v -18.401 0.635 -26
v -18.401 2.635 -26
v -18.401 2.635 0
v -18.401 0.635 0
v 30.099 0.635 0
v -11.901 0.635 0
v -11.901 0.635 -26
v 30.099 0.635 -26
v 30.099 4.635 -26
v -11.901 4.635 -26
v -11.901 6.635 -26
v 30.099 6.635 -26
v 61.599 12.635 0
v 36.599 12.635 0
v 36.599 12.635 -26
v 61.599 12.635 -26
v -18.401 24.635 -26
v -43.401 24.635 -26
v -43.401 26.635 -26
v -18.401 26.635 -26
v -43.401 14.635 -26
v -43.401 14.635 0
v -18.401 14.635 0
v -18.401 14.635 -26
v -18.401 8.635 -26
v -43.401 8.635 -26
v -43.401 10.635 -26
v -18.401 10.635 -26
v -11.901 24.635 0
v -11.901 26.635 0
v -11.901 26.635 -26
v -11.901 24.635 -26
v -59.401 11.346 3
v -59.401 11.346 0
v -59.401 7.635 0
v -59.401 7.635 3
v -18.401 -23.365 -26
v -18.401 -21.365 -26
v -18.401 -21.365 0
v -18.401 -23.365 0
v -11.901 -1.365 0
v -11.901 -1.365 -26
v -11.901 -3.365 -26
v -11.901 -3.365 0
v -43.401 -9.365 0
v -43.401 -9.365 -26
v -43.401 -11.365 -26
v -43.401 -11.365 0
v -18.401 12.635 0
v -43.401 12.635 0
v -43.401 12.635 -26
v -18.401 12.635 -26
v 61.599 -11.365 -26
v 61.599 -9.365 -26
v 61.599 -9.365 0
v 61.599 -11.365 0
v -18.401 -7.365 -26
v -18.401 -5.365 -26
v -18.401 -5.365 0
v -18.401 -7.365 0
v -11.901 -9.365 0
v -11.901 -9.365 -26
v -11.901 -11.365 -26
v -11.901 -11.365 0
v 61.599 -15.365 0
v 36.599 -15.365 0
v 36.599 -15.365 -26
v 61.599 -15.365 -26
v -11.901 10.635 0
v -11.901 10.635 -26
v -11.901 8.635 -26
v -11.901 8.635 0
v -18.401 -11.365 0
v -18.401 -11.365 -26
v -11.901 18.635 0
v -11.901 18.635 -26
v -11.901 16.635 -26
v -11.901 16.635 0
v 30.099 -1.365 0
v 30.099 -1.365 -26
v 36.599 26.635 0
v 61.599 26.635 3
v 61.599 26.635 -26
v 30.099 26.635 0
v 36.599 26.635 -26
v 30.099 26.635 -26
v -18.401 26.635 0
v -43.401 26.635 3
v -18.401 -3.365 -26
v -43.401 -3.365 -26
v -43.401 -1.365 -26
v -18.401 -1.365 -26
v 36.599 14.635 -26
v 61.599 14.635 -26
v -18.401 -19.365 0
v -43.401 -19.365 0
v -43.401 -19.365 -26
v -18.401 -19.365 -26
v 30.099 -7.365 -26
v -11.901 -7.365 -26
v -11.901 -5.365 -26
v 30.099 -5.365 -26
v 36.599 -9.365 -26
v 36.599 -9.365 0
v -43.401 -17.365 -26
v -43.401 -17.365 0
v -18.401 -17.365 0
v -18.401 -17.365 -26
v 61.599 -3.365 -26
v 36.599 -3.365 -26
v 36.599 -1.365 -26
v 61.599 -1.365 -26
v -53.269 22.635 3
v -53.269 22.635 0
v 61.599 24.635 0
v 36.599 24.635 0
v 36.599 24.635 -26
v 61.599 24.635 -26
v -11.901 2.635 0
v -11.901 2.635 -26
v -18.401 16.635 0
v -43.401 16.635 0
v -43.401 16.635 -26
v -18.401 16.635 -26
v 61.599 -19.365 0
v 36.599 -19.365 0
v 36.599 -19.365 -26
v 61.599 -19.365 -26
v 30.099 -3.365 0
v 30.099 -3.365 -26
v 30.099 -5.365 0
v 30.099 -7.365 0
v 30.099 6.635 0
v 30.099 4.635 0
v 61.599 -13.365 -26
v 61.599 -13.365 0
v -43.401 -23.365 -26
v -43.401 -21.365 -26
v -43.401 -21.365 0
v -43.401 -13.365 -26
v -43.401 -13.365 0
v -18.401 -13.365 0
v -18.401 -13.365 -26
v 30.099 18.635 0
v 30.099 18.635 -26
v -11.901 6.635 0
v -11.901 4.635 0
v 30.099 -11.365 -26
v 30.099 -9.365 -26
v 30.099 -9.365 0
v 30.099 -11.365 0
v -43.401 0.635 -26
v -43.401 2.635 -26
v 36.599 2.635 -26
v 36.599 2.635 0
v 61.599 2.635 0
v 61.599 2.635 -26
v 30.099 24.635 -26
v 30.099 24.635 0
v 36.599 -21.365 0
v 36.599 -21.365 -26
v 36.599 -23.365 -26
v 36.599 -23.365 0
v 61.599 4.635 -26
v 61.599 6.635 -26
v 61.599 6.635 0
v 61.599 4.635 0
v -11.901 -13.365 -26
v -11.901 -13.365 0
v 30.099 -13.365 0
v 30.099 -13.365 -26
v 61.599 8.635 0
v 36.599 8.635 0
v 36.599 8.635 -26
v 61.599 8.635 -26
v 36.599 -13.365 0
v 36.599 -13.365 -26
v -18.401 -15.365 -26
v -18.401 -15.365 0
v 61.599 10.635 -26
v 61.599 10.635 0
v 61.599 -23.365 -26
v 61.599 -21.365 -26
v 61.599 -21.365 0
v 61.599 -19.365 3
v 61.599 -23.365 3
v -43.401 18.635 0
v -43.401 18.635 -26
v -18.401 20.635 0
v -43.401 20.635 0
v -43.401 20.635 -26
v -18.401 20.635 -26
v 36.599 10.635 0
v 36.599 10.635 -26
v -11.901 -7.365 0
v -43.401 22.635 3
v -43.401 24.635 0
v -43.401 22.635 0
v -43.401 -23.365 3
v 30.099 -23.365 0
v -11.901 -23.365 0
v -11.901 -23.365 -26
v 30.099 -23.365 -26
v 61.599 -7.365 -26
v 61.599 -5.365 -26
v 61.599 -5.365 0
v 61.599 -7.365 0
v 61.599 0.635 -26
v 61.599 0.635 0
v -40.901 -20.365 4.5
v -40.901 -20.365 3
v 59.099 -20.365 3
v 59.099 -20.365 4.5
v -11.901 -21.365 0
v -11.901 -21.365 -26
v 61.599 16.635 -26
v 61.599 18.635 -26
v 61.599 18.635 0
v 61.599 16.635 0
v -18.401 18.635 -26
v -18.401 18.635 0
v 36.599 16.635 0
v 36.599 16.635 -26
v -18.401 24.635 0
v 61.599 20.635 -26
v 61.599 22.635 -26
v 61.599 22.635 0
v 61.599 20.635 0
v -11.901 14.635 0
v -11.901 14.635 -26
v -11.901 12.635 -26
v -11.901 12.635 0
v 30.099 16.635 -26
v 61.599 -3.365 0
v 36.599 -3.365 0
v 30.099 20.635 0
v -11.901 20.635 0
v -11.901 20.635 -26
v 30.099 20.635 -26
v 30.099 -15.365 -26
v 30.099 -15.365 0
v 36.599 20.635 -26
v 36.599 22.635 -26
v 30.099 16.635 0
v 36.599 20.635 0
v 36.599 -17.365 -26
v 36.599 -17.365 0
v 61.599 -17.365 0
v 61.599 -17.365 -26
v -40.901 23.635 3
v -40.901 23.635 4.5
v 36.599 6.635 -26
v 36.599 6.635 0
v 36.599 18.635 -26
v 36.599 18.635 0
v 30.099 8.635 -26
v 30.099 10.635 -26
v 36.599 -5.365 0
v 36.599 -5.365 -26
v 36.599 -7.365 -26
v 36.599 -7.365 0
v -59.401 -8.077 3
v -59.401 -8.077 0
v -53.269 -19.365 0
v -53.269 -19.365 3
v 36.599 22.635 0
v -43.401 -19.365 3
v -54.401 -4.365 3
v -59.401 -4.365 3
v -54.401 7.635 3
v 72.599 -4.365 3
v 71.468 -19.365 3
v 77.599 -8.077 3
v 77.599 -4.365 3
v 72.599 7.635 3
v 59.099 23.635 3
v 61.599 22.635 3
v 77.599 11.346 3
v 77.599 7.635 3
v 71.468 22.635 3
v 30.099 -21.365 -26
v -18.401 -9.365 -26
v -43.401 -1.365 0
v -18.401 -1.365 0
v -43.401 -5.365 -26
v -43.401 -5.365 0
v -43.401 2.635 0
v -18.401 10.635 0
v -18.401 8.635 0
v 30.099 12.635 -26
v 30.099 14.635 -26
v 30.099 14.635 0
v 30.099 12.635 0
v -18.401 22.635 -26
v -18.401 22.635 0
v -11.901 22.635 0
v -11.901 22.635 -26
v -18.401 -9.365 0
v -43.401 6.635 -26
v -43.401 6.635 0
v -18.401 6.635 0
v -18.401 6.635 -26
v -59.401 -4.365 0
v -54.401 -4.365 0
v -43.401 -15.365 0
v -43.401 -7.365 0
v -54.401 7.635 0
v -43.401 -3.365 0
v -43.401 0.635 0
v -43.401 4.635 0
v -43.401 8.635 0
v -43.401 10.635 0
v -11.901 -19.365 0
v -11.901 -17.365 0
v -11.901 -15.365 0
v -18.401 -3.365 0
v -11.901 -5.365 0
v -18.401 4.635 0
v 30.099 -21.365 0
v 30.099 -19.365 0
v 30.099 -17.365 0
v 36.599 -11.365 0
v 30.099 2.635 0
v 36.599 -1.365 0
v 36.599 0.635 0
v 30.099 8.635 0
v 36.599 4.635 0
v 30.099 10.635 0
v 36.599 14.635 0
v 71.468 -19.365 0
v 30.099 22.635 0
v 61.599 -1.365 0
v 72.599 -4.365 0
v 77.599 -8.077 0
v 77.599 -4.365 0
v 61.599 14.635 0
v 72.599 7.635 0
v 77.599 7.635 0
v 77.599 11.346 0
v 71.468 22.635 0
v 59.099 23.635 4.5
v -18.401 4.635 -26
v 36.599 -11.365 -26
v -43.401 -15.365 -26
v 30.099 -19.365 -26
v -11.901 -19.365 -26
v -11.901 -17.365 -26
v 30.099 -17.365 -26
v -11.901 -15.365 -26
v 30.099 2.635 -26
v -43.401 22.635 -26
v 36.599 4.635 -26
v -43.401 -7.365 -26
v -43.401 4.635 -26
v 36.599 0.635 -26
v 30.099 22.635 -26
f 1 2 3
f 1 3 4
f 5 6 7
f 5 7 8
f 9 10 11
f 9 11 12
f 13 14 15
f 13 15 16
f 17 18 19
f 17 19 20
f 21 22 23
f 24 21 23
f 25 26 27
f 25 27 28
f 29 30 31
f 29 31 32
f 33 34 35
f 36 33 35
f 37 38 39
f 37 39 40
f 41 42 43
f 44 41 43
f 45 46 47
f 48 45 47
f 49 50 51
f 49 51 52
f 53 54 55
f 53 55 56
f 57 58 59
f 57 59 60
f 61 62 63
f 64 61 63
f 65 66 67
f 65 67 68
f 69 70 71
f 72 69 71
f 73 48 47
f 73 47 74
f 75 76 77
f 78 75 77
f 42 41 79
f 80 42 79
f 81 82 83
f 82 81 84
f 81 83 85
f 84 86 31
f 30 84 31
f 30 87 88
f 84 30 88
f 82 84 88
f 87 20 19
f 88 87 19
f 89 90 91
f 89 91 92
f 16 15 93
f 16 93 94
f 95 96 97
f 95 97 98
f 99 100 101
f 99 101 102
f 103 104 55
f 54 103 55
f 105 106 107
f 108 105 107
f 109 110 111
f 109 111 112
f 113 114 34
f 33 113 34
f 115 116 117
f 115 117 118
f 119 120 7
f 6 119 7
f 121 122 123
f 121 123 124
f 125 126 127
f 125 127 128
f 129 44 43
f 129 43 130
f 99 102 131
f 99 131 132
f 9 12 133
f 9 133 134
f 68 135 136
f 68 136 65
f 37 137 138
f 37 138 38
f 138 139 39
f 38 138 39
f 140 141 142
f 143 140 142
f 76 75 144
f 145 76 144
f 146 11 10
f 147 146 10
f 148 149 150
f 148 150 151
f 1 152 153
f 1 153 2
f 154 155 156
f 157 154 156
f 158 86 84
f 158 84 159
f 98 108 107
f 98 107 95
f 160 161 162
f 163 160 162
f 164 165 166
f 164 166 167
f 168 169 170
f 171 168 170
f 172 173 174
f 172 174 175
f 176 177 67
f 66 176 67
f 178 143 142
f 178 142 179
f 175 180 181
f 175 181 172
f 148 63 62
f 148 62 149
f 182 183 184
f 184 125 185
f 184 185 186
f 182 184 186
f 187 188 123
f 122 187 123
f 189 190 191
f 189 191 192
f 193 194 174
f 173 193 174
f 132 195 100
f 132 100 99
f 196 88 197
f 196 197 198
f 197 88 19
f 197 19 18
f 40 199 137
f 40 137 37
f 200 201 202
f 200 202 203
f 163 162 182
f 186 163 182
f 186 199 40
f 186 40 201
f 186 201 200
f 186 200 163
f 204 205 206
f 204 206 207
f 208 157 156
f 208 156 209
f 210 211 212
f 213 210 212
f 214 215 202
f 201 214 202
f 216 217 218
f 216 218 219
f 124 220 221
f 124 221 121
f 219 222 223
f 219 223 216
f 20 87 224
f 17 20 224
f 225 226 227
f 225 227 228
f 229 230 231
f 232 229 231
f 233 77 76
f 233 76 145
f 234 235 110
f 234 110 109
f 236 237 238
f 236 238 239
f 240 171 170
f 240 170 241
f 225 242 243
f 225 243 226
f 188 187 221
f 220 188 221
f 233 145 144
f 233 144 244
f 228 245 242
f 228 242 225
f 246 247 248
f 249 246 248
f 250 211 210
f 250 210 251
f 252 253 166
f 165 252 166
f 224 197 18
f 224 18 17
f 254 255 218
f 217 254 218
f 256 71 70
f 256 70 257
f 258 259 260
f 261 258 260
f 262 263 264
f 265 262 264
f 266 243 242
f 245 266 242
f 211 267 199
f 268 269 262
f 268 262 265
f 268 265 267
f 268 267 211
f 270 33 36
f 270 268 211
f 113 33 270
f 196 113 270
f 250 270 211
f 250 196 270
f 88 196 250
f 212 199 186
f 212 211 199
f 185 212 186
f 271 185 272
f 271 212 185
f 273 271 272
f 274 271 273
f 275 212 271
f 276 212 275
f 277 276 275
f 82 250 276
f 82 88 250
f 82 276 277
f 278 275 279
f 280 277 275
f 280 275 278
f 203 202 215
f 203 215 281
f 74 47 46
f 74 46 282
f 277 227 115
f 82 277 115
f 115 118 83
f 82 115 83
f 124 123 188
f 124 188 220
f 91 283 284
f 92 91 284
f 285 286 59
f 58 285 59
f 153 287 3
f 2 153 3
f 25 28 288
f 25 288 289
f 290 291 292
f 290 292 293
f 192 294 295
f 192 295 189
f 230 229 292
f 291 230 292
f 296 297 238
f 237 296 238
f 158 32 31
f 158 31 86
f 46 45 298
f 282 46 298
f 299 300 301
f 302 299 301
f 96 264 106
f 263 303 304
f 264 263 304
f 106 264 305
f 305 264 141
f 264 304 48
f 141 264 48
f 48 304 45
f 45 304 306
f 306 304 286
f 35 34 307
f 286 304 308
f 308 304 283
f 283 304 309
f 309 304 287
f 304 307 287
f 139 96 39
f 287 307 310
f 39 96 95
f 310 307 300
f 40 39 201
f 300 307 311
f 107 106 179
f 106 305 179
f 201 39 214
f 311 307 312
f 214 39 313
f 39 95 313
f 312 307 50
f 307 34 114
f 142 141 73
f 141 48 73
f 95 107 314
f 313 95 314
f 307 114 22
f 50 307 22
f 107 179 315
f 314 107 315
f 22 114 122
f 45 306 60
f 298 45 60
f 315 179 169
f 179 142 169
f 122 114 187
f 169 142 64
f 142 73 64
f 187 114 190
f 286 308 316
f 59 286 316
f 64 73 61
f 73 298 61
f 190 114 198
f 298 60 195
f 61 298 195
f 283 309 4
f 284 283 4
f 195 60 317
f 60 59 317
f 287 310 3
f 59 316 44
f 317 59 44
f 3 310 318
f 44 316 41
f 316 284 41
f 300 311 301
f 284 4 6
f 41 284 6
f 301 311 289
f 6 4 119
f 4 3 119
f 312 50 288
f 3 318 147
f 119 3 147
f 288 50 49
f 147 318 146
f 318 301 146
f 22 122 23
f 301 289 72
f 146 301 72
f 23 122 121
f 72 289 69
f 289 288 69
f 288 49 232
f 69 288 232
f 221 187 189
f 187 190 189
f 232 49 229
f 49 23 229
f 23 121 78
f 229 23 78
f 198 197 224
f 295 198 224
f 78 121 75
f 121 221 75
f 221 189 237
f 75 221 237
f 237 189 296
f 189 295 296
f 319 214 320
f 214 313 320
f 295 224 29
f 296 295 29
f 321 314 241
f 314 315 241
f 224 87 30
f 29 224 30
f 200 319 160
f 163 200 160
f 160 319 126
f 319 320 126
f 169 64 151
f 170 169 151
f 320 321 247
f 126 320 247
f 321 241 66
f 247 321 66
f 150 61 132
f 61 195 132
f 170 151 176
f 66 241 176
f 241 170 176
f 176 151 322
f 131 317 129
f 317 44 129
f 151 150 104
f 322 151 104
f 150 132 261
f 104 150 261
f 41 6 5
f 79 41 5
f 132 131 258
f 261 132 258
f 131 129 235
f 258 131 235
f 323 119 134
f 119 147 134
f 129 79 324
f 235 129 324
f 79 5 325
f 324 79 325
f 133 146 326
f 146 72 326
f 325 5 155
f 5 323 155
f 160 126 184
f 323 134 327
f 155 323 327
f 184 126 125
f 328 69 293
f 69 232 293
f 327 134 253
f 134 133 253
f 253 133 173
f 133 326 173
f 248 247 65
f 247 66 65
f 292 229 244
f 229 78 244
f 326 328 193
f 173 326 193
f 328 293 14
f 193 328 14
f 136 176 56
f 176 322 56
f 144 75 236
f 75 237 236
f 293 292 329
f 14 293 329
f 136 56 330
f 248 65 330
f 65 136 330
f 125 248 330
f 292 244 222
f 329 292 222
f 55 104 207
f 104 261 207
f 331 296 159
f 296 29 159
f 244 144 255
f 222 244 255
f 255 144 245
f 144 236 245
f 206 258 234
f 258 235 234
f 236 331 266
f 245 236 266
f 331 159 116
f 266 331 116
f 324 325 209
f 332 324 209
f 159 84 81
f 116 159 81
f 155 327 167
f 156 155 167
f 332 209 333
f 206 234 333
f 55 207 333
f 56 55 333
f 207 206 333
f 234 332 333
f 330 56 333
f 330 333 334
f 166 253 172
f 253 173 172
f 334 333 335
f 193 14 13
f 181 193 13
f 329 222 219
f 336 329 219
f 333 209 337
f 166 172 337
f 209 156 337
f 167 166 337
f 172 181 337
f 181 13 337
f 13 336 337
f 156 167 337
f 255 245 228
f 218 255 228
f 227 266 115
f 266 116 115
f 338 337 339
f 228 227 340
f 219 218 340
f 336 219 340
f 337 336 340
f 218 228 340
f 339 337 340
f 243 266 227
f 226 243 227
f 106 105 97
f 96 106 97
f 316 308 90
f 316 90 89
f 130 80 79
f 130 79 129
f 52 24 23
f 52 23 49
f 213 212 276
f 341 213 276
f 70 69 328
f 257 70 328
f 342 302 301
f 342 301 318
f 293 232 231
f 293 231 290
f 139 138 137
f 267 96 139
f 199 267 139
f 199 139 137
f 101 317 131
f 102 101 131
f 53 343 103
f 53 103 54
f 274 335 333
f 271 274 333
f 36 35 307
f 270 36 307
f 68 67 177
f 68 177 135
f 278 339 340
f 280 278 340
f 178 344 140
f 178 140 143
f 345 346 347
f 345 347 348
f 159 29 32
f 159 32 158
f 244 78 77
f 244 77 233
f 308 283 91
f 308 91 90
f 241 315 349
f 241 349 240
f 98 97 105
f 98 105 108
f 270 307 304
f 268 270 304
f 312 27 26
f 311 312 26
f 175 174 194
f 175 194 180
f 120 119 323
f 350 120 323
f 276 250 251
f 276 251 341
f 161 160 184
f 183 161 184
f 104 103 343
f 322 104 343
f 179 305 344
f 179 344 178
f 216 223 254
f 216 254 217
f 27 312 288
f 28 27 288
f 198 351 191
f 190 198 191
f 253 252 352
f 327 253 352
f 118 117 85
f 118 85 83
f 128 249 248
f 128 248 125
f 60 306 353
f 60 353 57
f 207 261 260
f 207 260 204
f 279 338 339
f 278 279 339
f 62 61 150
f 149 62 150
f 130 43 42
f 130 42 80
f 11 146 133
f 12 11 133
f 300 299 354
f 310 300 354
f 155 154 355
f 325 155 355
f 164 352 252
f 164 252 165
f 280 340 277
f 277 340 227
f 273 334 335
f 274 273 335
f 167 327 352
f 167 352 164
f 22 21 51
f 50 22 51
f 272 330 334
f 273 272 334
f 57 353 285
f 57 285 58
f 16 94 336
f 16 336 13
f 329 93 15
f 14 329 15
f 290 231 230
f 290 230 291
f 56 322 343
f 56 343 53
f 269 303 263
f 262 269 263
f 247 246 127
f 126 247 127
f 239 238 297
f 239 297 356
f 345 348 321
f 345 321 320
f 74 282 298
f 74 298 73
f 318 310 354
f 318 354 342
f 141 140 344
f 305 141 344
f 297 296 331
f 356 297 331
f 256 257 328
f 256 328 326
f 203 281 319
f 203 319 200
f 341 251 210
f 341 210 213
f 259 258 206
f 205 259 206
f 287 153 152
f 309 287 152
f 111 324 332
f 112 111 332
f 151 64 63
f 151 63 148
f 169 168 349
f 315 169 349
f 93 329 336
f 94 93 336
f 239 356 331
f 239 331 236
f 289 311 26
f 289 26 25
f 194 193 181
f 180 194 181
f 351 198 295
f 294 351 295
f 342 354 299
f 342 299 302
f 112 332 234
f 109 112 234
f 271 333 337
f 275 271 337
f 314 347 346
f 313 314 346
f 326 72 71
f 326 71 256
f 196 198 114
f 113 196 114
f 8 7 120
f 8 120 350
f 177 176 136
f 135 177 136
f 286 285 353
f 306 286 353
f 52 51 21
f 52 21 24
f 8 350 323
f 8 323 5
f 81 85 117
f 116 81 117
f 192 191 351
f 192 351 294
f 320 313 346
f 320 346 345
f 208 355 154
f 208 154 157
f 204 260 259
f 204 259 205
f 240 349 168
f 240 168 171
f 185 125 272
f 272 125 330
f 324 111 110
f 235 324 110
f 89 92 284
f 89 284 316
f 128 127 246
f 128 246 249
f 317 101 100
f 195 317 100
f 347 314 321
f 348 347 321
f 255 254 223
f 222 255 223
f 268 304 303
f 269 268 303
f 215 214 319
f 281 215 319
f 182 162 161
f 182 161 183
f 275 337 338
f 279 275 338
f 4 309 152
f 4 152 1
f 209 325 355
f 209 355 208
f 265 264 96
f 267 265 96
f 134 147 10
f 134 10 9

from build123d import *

# Parameters (mm, degrees)
F1_DEPTH = 3
F2_W     = 100
F2_H     = 44
F3_DEPTH = 1.5
F4_W     = 105
F4_H     = 2
F5_DEPTH = 26
F6_W     = 6.5
F6_H     = 71.201939
F6_H_2   = 68.703625
F7_DEPTH = 26


with BuildPart() as f1:
    # F0 (on Top) → F1 (new body)
    with BuildSketch(Plane.XY):
        Polygon((9.09921, 26.634615), (-43.40079, 26.634615), (-43.40079, 22.634615), (-53.269234, 22.634615), (-59.40079, 11.346154), (-59.40079, 7.634615), (-54.40079, 7.634615), (-54.40079, 1.634615), (-54.40079, -4.365385), (-59.40079, -4.365385), (-59.40079, -8.076923), (-53.269234, -19.365385), (-43.40079, -19.365385), (-43.40079, -23.365385), (61.59921, -23.365385), (61.59921, -19.365385), (71.467653, -19.365385), (77.59921, -8.076923), (77.59921, -4.365385), (72.59921, -4.365385), (72.59921, 7.634615), (77.59921, 7.634615), (77.59921, 11.346154), (71.467653, 22.634615), (61.59921, 22.634615), (61.59921, 26.634615), align=None)
    extrude(amount=F1_DEPTH)

    # F2 (on face) → F3 (join)
    with BuildSketch(Plane.XY.offset(3)):
        with Locations((9.09921, 1.634615)):
            Rectangle(F2_W, F2_H)
    extrude(amount=F3_DEPTH)

    # F4 (on face) → F5 (join)
    with BuildSketch(Plane(origin=(0, 0, 0), x_dir=(1, 0, 0), z_dir=(0, 0, -1))):
        with Locations((9.09921, 22.365385)):
            Rectangle(F4_W, F4_H)
        with Locations((9.09921, 18.365385)):
            Rectangle(F4_W, F4_H)
        with Locations((9.09921, 14.365385)):
            Rectangle(F4_W, F4_H)
        with Locations((9.09921, 10.365385)):
            Rectangle(F4_W, F4_H)
        with Locations((9.09921, 6.365385)):
            Rectangle(F4_W, F4_H)
        with Locations((9.09921, 2.365385)):
            Rectangle(F4_W, F4_H)
        with Locations((9.09921, -1.634615)):
            Rectangle(F4_W, F4_H)
        with Locations((9.09921, -5.634615)):
            Rectangle(F4_W, F4_H)
        with Locations((9.09921, -9.634615)):
            Rectangle(F4_W, F4_H)
        with Locations((9.09921, -13.634615)):
            Rectangle(F4_W, F4_H)
        with Locations((9.09921, -17.634615)):
            Rectangle(F4_W, F4_H)
        with Locations((9.09921, -21.634615)):
            Rectangle(F4_W, F4_H)
        with Locations((9.09921, -25.634615)):
            Rectangle(F4_W, F4_H)
    extrude(amount=F5_DEPTH)

    # F6 (on face) → F7 (cut)
    with BuildSketch(Plane(origin=(0, 0, -26), x_dir=(1, 0, 0), z_dir=(0, 0, -1))):
        with Locations((-15.15079, -5.566442)):
            Rectangle(F6_W, F6_H)
        with Locations((33.34921, -3.692707)):
            Rectangle(F6_W, F6_H_2)
    extrude(amount=-F7_DEPTH, mode=Mode.SUBTRACT)


solid = f1.part
